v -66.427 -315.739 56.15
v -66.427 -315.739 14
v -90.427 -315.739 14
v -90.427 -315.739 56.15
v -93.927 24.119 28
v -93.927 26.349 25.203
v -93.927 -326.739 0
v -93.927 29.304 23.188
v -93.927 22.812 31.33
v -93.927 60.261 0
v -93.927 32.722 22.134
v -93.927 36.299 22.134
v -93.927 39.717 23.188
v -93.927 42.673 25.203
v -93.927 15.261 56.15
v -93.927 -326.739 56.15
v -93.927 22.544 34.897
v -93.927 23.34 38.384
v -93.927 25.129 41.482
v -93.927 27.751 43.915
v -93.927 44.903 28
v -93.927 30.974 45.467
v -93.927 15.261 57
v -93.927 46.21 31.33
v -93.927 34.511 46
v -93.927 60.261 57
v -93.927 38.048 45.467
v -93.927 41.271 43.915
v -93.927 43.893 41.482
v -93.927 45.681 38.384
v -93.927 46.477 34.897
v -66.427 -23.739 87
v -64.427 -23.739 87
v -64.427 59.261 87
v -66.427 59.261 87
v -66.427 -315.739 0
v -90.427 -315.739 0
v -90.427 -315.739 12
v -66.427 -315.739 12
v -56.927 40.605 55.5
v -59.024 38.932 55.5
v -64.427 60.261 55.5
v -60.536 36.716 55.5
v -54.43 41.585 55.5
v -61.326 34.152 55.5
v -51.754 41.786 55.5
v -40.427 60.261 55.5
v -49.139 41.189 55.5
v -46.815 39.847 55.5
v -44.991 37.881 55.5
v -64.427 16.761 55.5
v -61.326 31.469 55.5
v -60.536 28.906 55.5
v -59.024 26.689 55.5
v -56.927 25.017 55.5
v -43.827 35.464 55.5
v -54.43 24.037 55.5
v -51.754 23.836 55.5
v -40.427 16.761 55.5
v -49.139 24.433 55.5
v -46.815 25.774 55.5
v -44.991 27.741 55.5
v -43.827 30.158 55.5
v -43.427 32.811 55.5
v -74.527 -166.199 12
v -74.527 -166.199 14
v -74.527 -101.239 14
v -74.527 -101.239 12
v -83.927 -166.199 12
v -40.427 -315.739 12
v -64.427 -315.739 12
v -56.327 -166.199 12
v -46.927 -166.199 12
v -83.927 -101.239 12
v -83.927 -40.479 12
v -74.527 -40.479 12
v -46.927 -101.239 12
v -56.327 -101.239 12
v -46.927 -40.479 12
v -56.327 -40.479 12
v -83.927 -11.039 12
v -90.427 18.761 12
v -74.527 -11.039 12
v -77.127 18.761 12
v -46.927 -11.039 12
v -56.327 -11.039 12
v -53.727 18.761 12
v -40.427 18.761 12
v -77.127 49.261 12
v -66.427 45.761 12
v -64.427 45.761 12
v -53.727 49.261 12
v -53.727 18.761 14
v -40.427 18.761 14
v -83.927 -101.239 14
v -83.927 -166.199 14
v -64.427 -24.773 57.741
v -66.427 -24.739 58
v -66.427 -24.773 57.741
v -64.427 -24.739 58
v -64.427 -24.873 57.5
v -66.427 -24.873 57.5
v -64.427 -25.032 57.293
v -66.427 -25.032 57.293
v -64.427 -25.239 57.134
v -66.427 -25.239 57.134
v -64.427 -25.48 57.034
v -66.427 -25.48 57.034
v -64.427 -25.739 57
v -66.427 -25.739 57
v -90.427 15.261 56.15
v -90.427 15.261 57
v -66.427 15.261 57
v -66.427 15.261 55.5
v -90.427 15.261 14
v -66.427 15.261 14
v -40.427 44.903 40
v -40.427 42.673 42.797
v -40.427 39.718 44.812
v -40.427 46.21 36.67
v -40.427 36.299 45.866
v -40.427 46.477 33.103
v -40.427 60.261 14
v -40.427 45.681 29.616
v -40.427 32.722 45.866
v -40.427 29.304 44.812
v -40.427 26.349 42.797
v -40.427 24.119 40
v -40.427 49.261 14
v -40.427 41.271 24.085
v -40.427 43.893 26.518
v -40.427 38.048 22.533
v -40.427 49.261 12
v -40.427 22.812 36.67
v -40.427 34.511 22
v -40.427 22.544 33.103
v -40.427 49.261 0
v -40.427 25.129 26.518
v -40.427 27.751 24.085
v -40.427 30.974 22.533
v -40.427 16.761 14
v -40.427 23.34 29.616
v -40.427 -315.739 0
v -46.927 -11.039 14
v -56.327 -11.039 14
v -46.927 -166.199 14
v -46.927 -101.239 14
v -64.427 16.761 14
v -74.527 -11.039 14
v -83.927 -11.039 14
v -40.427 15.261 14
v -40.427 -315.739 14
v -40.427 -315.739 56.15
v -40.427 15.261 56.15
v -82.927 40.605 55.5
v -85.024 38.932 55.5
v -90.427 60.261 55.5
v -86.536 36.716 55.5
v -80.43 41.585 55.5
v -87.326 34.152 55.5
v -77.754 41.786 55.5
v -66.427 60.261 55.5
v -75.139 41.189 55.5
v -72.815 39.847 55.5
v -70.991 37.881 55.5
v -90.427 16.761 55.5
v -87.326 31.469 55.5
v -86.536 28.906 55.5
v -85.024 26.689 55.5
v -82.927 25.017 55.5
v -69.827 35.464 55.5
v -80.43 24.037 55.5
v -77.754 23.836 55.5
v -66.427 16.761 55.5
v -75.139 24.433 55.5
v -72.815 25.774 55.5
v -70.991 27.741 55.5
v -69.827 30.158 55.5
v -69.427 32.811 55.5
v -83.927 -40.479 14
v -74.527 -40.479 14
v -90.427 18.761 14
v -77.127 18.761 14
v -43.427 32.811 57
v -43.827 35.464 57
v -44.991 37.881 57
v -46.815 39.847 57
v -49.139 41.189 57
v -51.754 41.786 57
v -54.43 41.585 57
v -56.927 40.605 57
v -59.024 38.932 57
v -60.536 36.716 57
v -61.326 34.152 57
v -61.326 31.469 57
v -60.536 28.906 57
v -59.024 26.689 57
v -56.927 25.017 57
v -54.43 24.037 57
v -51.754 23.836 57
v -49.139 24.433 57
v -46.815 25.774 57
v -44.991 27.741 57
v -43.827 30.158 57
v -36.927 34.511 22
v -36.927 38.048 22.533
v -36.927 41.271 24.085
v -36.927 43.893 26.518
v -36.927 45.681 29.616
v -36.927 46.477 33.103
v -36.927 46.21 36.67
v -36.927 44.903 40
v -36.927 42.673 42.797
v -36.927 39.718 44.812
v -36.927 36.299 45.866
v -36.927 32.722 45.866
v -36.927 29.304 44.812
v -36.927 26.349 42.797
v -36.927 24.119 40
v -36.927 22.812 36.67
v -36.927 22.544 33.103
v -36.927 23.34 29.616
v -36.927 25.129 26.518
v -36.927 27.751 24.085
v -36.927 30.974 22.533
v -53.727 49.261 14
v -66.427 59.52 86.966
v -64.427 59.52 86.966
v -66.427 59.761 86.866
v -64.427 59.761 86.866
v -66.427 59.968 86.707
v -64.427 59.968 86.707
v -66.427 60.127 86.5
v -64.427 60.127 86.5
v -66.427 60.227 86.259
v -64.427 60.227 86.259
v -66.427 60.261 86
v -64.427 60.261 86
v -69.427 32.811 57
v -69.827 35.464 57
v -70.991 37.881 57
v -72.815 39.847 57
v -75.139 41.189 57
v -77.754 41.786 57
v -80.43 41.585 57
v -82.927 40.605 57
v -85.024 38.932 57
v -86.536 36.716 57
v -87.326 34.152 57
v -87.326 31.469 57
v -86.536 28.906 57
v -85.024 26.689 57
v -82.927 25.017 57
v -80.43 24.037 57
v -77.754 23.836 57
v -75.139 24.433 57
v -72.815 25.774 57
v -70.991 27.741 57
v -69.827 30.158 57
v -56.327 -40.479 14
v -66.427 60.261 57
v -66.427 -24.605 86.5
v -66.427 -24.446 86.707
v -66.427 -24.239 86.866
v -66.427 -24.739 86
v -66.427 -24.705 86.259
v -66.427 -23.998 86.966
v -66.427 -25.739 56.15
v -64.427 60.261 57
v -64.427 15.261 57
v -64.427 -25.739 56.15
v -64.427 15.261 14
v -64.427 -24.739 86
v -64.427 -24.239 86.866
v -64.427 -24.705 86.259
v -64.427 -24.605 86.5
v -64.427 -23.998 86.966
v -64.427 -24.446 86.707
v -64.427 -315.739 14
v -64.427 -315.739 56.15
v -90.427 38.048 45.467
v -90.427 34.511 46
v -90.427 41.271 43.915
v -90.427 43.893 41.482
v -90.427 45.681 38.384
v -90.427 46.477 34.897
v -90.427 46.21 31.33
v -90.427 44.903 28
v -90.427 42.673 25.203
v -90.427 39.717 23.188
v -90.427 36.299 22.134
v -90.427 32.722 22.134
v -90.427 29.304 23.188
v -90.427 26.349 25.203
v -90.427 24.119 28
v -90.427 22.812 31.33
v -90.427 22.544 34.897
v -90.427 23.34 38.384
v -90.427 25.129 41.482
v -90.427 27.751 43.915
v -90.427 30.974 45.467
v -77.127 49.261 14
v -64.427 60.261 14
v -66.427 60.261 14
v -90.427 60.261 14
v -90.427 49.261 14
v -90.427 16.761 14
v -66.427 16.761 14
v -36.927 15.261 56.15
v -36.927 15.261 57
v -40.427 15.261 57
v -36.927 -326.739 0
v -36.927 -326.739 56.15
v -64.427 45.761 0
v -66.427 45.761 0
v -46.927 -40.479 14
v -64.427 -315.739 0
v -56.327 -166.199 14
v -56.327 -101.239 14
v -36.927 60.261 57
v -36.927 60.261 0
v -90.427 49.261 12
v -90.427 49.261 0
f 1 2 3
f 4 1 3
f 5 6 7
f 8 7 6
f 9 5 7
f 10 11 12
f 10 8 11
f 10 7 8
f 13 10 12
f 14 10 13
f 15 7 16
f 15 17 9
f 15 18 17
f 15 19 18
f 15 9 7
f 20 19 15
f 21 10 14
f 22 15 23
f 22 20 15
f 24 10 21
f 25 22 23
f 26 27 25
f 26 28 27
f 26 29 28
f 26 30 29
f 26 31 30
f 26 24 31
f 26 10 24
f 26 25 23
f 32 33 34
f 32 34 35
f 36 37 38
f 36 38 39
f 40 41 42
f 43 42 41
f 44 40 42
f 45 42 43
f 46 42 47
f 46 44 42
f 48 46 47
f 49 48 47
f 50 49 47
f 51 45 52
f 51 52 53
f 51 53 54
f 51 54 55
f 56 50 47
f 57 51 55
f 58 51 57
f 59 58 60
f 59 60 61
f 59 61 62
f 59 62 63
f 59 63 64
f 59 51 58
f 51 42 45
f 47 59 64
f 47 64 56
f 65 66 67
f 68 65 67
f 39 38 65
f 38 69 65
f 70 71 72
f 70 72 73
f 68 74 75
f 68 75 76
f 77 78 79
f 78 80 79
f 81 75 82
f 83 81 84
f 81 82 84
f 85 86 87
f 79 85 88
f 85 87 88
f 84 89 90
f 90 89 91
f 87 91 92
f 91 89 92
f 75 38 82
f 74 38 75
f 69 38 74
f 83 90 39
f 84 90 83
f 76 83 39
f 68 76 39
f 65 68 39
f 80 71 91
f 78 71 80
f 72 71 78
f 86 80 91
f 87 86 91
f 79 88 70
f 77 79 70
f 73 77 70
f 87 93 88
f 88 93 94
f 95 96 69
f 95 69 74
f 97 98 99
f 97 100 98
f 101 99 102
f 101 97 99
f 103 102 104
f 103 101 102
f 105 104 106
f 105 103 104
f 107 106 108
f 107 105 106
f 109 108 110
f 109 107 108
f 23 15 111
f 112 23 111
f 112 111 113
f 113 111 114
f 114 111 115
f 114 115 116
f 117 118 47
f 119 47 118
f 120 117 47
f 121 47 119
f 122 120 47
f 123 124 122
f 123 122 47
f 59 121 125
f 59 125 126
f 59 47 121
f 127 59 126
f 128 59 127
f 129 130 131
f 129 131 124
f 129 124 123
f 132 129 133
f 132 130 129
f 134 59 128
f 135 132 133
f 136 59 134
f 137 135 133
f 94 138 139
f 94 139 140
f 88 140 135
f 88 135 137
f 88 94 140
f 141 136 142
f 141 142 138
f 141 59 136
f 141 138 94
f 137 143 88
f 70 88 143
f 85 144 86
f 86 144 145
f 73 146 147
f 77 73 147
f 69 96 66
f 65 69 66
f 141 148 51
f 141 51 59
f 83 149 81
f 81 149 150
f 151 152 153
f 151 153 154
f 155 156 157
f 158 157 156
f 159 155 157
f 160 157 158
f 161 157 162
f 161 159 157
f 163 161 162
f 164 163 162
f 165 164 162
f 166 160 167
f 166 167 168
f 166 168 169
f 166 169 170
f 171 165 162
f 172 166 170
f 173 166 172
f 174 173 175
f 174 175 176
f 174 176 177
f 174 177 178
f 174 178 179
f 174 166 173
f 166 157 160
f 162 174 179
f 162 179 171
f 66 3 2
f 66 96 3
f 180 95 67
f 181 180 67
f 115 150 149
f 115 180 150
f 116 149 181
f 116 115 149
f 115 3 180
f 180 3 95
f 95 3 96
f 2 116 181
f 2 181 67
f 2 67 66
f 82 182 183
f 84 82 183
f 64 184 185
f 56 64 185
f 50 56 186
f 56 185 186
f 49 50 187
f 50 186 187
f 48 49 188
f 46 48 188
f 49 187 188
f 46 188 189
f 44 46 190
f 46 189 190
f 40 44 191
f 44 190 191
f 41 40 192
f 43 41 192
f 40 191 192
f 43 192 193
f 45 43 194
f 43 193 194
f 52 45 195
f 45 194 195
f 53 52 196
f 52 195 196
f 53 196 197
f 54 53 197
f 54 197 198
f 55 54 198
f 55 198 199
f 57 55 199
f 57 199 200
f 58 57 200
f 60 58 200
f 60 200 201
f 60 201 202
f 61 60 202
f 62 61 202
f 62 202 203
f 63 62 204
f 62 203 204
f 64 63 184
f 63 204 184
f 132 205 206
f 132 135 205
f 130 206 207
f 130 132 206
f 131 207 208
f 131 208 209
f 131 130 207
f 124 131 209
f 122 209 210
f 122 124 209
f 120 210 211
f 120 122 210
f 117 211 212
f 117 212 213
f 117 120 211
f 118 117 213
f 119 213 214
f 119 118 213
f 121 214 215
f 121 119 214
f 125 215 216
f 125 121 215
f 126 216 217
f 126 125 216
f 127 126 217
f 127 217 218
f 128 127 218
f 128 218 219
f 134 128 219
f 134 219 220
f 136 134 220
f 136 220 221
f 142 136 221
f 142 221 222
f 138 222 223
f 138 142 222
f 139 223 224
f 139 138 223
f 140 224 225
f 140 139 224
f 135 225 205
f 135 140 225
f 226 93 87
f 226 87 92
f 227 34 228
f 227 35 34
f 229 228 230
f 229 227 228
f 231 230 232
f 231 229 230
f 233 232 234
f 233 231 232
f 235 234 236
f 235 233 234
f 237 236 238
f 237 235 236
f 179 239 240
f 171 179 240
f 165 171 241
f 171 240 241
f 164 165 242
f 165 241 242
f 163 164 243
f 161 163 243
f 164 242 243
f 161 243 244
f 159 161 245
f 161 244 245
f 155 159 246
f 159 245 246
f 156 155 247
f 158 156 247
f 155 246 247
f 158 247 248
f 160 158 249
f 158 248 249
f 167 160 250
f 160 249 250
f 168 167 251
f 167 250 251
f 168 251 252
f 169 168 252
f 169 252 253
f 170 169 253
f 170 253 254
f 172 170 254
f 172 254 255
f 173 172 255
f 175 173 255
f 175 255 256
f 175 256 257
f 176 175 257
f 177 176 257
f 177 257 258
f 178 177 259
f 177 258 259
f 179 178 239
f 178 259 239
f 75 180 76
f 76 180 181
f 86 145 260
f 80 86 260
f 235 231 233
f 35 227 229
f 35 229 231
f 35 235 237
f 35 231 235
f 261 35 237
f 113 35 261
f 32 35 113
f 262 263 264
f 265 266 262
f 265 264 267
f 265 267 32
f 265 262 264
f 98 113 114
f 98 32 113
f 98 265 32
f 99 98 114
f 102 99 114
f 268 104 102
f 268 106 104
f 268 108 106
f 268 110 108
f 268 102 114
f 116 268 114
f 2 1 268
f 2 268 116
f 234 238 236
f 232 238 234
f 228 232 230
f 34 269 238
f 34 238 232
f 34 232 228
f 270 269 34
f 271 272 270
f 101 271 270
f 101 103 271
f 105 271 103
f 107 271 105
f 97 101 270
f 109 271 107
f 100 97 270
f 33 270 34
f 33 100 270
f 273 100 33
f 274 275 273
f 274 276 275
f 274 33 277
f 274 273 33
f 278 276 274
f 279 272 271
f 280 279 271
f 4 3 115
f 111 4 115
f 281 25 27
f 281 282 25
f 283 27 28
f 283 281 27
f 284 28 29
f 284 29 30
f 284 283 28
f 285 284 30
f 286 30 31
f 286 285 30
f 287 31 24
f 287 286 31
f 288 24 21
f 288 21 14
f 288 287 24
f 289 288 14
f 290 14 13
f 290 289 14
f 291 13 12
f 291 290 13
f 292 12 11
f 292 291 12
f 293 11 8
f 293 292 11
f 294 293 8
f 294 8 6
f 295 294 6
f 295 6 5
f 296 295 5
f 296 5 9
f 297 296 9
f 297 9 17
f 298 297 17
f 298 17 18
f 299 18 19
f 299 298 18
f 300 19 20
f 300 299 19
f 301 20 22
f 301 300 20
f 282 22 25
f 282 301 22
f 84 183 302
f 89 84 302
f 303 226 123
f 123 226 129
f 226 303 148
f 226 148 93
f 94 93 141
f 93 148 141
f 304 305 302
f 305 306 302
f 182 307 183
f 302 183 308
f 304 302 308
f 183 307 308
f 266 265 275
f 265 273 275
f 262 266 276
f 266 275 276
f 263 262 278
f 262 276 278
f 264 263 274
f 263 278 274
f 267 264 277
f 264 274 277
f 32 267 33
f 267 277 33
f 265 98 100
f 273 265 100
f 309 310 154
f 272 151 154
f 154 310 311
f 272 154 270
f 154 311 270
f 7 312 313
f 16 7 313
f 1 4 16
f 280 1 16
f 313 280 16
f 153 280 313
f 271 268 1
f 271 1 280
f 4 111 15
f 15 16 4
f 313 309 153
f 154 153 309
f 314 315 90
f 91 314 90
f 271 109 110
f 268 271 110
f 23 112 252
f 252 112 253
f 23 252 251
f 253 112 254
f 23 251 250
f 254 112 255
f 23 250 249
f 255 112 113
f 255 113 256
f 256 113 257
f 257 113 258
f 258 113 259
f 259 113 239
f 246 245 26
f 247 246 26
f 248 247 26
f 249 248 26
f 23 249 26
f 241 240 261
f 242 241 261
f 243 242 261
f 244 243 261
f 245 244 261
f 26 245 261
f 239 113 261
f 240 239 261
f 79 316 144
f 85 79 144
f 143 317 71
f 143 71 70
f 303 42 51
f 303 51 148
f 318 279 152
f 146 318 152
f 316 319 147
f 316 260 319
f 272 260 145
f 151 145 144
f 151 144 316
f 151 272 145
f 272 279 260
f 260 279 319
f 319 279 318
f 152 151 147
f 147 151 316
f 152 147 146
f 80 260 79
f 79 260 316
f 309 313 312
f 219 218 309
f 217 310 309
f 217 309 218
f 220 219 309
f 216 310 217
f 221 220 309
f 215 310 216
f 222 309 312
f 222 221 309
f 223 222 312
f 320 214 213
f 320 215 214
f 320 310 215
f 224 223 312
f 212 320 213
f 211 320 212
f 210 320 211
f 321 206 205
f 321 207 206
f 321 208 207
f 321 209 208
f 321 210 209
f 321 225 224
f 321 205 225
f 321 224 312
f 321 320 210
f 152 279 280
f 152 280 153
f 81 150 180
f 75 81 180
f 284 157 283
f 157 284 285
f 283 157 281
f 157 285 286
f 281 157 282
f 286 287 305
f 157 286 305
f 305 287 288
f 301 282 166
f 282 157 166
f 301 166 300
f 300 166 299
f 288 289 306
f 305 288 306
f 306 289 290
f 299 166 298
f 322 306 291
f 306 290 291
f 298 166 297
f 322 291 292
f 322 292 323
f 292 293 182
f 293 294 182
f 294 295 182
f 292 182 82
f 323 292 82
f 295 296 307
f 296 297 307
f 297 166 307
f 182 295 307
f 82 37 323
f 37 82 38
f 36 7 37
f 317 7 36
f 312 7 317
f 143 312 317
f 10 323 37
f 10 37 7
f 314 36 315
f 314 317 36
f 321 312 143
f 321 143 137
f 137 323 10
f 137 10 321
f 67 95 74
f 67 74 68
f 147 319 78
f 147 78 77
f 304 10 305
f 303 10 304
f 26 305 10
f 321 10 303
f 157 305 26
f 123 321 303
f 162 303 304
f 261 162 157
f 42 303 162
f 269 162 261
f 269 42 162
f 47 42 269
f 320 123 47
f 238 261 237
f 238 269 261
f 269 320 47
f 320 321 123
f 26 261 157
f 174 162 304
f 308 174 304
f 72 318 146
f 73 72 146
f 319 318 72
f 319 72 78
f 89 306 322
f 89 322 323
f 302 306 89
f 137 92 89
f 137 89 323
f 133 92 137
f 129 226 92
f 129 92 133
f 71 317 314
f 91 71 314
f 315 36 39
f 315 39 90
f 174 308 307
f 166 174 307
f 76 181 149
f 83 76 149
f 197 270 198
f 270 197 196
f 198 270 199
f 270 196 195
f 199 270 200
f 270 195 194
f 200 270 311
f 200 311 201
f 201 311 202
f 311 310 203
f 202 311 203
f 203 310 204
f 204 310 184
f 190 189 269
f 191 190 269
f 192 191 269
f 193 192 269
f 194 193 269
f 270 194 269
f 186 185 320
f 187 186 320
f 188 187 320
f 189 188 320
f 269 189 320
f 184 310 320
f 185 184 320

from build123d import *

# Parameters (mm, degrees)
SZKIC1_W                     = 53
SZKIC1_H                     = 374
SZKIC1_W_2                   = 24
SZKIC1_H_2                   = 365
DODANIE_WYCI_GNI_CIE2_DEPTH  = 12
SZKIC2_W                     = 12
SZKIC2_H                     = 3.5
WYTNIJ_WYCI_GNI_CIE1_DEPTH   = 2
SZKIC3_W                     = 53
SZKIC3_H                     = 374
DODANIE_WYCI_GNI_CIE3_DEPTH  = 2
SZKIC4_W                     = 13.3
SZKIC4_H                     = 30.500081729
SZKIC4_W_2                   = 9.4
SZKIC4_H_2                   = 64.96
WYTNIJ_WYCI_GNI_CIE2_DEPTH   = 2
SZKIC5_W                     = 2
SZKIC5_H                     = 374
DODANIE_WYCI_GNI_CIE4_DEPTH  = 43
DODANIE_WYCI_GNI_CIE5_DEPTH  = 41.5
SZKIC7_W                     = 25.5
SZKIC7_H                     = 38.500081729
DODANIE_WYCI_GNI_CIE6_DEPTH  = 1.5
SZKIC9_R                     = 12
WYTNIJ_WYCI_GNI_CIE4_DEPTH   = 1.5
DODANIE_WYCI_GNI_CIE7_DEPTH  = 43
DODANIE_WYCI_GNI_CIE8_DEPTH  = 43
SZKIC12_R                    = 12
WYTNIJ_WYCI_GNI_CIE5_DEPTH   = 1.5
SZKIC13_R                    = 9
WYTNIJ_WYCI_GNI_CIE6_DEPTH   = 1.5
SZKIC14_W                    = 57
SZKIC14_H                    = 374
SZKIC14_R                    = 12
DODANIE_WYCI_GNI_CIE9_DEPTH  = 1
SZKIC15_W                    = 57
SZKIC15_H                    = 374
SZKIC15_R                    = 12
DODANIE_WYCI_GNI_CIE10_DEPTH = 1
SZKIC16_W                    = 55
SZKIC16_H                    = 57
SZKIC16_W_2                  = 24
SZKIC16_H_2                  = 41.5
DODANIE_WYCI_GNI_CIE11_DEPTH = 1
SZKIC17_W                    = 55
SZKIC17_H                    = 57
DODANIE_WYCI_GNI_CIE12_DEPTH = 1
DODANIE_WYCI_GNI_CIE13_DEPTH = 30
SZKIC20_W                    = 55
SZKIC20_H                    = 57
DODANIE_WYCI_GNI_CIE14_DEPTH = 5.5
SZKIC21_W                    = 24
SZKIC21_H                    = 41.5
DODANIE_WYCI_GNI_CIE15_DEPTH = 5.5
SZKIC22_W                    = 57
SZKIC22_H                    = 387
SZKIC22_R                    = 12
DODANIE_WYCI_GNI_CIE16_DEPTH = 1
SZKIC23_W                    = 57
SZKIC23_H                    = 387
SZKIC23_R                    = 12
DODANIE_WYCI_GNI_CIE17_DEPTH = 1
ZAOKR_GLENIE1_R              = 1
ZAOKR_GLENIE2_R              = 1
ZAOKR_GLENIE3_R              = 1
WYTNIJ_WYCI_GNI_CIE7_DEPTH   = 0.85


with BuildPart() as part:
    # Szkic1 → Dodanie-wyciągnięcie2 (new body)
    with BuildSketch(Plane.XY):
        with Locations((-65.426891924, -133.239080048)):
            Rectangle(SZKIC1_W, SZKIC1_H)
        with Locations((-78.426891924, -133.239080048)):
            Rectangle(SZKIC1_W_2, SZKIC1_H_2, mode=Mode.SUBTRACT)
        with Locations((-52.426891924, -133.239080048)):
            Rectangle(SZKIC1_W_2, SZKIC1_H_2, mode=Mode.SUBTRACT)
    extrude(amount=DODANIE_WYCI_GNI_CIE2_DEPTH)

    # Szkic2 → Wytnij-wyciągnięcie1 (cut)
    with BuildSketch(Plane.ZY.offset(66.426891924)):
        with Locations((6, 47.510919952)):
            Rectangle(SZKIC2_W, SZKIC2_H)
    extrude(amount=-WYTNIJ_WYCI_GNI_CIE1_DEPTH, mode=Mode.SUBTRACT)

    # Szkic3 → Dodanie-wyciągnięcie3 (add)
    with BuildSketch(Plane.XY.offset(12)):
        with Locations((-65.426891924, -133.239080048)):
            Rectangle(SZKIC3_W, SZKIC3_H)
    extrude(amount=DODANIE_WYCI_GNI_CIE3_DEPTH)

    # Szkic4 → Wytnij-wyciągnięcie2 (cut)
    with BuildSketch(Plane.XY.offset(14)):
        Polygon((-46.926891924, -11.039080048), (-56.326891924, -11.039080048), (-56.326891924, -35.399080048), (-56.326891924, -40.479080048), (-46.926891924, -40.479080048), (-46.926891924, -35.399080048), align=None)
        with Locations((-47.076891924, 34.010879088)):
            Rectangle(SZKIC4_W, SZKIC4_H)
        with Locations((-83.776891924, 34.010879088)):
            Rectangle(SZKIC4_W, SZKIC4_H)
        Polygon((-74.526891924, -35.399080048), (-74.526891924, -11.039080048), (-83.926891924, -11.039080048), (-83.926891924, -35.399080048), (-83.926891924, -40.479080048), (-74.526891924, -40.479080048), align=None)
        with Locations((-51.626891924, -133.719080048)):
            Rectangle(SZKIC4_W_2, SZKIC4_H_2)
        with Locations((-79.226891924, -133.719080048)):
            Rectangle(SZKIC4_W_2, SZKIC4_H_2)
    extrude(amount=-WYTNIJ_WYCI_GNI_CIE2_DEPTH, mode=Mode.SUBTRACT)

    # Szkic5 → Dodanie-wyciągnięcie4 (add)
    with BuildSketch(Plane.XY.offset(14)):
        with Locations((-65.426891924, -133.239080048)):
            Rectangle(SZKIC5_W, SZKIC5_H)
    extrude(amount=DODANIE_WYCI_GNI_CIE4_DEPTH)

    # Szkic6 → Dodanie-wyciągnięcie5 (add)
    with BuildSketch(Plane.XY.offset(14)):
        Polygon((-64.426891924, 16.760838223), (-40.426891924, 16.760838223), (-40.426891924, 53.760919952), (-38.926891924, 53.760919952), (-38.926891924, 15.260838223), (-64.426891924, 15.260838223), align=None)
        Polygon((-90.426891924, 53.760919952), (-91.926891924, 53.760919952), (-91.926891924, 15.260838223), (-66.426891924, 15.260838223), (-66.426891924, 16.760838223), (-90.426891924, 16.760838223), align=None)
    extrude(amount=DODANIE_WYCI_GNI_CIE5_DEPTH)

    # Szkic7 → Dodanie-wyciągnięcie6 (add)
    with BuildSketch(Plane.XY.offset(55.5)):
        with Locations((-51.676891924, 34.510879088)):
            Rectangle(SZKIC7_W, SZKIC7_H)
        with Locations((-79.176891924, 34.510879088)):
            Rectangle(SZKIC7_W, SZKIC7_H)
    extrude(amount=DODANIE_WYCI_GNI_CIE6_DEPTH)

    # Szkic9 → Wytnij-wyciągnięcie4 (cut)
    with BuildSketch(Plane.ZY.offset(91.926891924)):
        with Locations((34, 34.510879088)):
            Circle(SZKIC9_R)
    extrude(amount=-WYTNIJ_WYCI_GNI_CIE4_DEPTH, mode=Mode.SUBTRACT)

    # Szkic10 → Dodanie-wyciągnięcie7 (add)
    with BuildSketch(Plane.XY.offset(14)):
        Polygon((-91.926891924, 15.260838223), (-91.926891924, -320.239080048), (-66.426891924, -320.239080048), (-66.426891924, -315.739080048), (-90.426891924, -315.739080048), (-90.426891924, 15.260838223), align=None)
    extrude(amount=DODANIE_WYCI_GNI_CIE7_DEPTH)

    # Szkic11 → Dodanie-wyciągnięcie8 (add)
    with BuildSketch(Plane.XY.offset(14)):
        Polygon((-38.926891924, 15.260838223), (-38.926891924, -320.239080048), (-64.426891924, -320.239080048), (-64.426891924, -315.739080048), (-40.426891924, -315.739080048), (-40.426891924, 15.260838223), align=None)
    extrude(amount=DODANIE_WYCI_GNI_CIE8_DEPTH)

    # Szkic12 → Wytnij-wyciągnięcie5 (cut)
    with BuildSketch(Plane(origin=(-38.926891924, 0, 0), x_dir=(0, 0, -1), z_dir=(1, 0, 0))):
        with Locations((-34, 34.510919952)):
            Circle(SZKIC12_R)
    extrude(amount=-WYTNIJ_WYCI_GNI_CIE5_DEPTH, mode=Mode.SUBTRACT)

    # Szkic13 → Wytnij-wyciągnięcie6 (cut)
    with BuildSketch(Plane.XY.offset(57)):
        with Locations((-78.426891924, 32.810879088)):
            Circle(SZKIC13_R)
        with Locations((-52.426891924, 32.810879088)):
            Circle(SZKIC13_R)
    extrude(amount=-WYTNIJ_WYCI_GNI_CIE6_DEPTH, mode=Mode.SUBTRACT)

    # Szkic14 → Dodanie-wyciągnięcie9 (add)
    with BuildSketch(Plane(origin=(-38.926891924, 0, 0), x_dir=(0, 0, -1), z_dir=(1, 0, 0))):
        with Locations((-28.5, -133.239080048)):
            Rectangle(SZKIC14_W, SZKIC14_H)
        with Locations((-34, 34.510919952)):
            Circle(SZKIC14_R, mode=Mode.SUBTRACT)
    extrude(amount=DODANIE_WYCI_GNI_CIE9_DEPTH)

    # Szkic15 → Dodanie-wyciągnięcie10 (add)
    with BuildSketch(Plane.ZY.offset(91.926891924)):
        with Locations((28.5, -133.239080048)):
            Rectangle(SZKIC15_W, SZKIC15_H)
        with Locations((34, 34.510879088)):
            Circle(SZKIC15_R, mode=Mode.SUBTRACT)
    extrude(amount=DODANIE_WYCI_GNI_CIE10_DEPTH)

    # Szkic16 → Dodanie-wyciągnięcie11 (add)
    with BuildSketch(Plane(origin=(0, 53.760919952, 0), x_dir=(1, 0, 0), z_dir=(0, 1, 0))):
        with Locations((-65.426891924, -28.5)):
            Rectangle(SZKIC16_W, SZKIC16_H)
        with Locations((-52.426891924, -34.75)):
            Rectangle(SZKIC16_W_2, SZKIC16_H_2, mode=Mode.SUBTRACT)
        with Locations((-78.426891924, -34.75)):
            Rectangle(SZKIC16_W_2, SZKIC16_H_2, mode=Mode.SUBTRACT)
    extrude(amount=DODANIE_WYCI_GNI_CIE11_DEPTH)

    # Szkic17 → Dodanie-wyciągnięcie12 (add)
    with BuildSketch(Plane.XZ.offset(320.239080048)):
        with Locations((-65.426891924, 28.5)):
            Rectangle(SZKIC17_W, SZKIC17_H)
    extrude(amount=DODANIE_WYCI_GNI_CIE12_DEPTH)

    # Szkic18 → Dodanie-wyciągnięcie13 (add)
    with BuildSketch(Plane.XY.offset(57)):
        Polygon((-64.426891924, 15.260838223), (-64.426891924, 54.760919952), (-66.426891924, 54.760919952), (-66.426891924, 15.260838223), (-66.426891924, -4.739161777), (-66.426891924, -24.739161777), (-64.426891924, -24.739161777), (-64.426891924, -4.739161777), align=None)
    extrude(amount=DODANIE_WYCI_GNI_CIE13_DEPTH)

    # Szkic20 → Dodanie-wyciągnięcie14 (add)
    with BuildSketch(Plane.XZ.offset(321.239080048)):
        with Locations((-65.426891924, 28.5)):
            Rectangle(SZKIC20_W, SZKIC20_H)
    extrude(amount=DODANIE_WYCI_GNI_CIE14_DEPTH)

    # Szkic21 → Dodanie-wyciągnięcie15 (add)
    with BuildSketch(Plane(origin=(0, 54.760919952, 0), x_dir=(1, 0, 0), z_dir=(0, 1, 0))):
        Polygon((-64.426891924, -87), (-66.426891924, -87), (-66.426891924, -57), (-92.926891924, -57), (-92.926891924, 0), (-37.926891924, 0), (-37.926891924, -57), (-64.426891924, -57), align=None)
        with Locations((-52.426891924, -34.75)):
            Rectangle(SZKIC21_W, SZKIC21_H, mode=Mode.SUBTRACT)
        with Locations((-78.426891924, -34.75)):
            Rectangle(SZKIC21_W, SZKIC21_H, mode=Mode.SUBTRACT)
    extrude(amount=DODANIE_WYCI_GNI_CIE15_DEPTH)

    # Szkic22 → Dodanie-wyciągnięcie16 (add)
    with BuildSketch(Plane(origin=(-37.926891924, 0, 0), x_dir=(0, 0, -1), z_dir=(1, 0, 0))):
        with Locations((-28.5, -133.239080048)):
            Rectangle(SZKIC22_W, SZKIC22_H)
        with Locations((-34, 34.510919952)):
            Circle(SZKIC22_R, mode=Mode.SUBTRACT)
    extrude(amount=DODANIE_WYCI_GNI_CIE16_DEPTH)

    # Szkic23 → Dodanie-wyciągnięcie17 (add)
    with BuildSketch(Plane.ZY.offset(92.926891924)):
        with Locations((28.5, -133.239080048)):
            Rectangle(SZKIC23_W, SZKIC23_H)
        with Locations((34, 34.510879088)):
            Circle(SZKIC23_R, mode=Mode.SUBTRACT)
    extrude(amount=DODANIE_WYCI_GNI_CIE17_DEPTH)

    # Zaokrąglenie1
    zaokr_glenie1_edges = [part.edges().sort_by_distance(p)[0] for p in [
        (-65.426891924, -24.739161777, 87),
    ]]
    fillet(zaokr_glenie1_edges, radius=ZAOKR_GLENIE1_R)

    # Zaokrąglenie2
    zaokr_glenie2_edges = [part.edges().sort_by_distance(p)[0] for p in [
        (-65.426891924, -24.739161777, 57),
    ]]
    fillet(zaokr_glenie2_edges, radius=ZAOKR_GLENIE2_R)

    # Zaokrąglenie3
    zaokr_glenie3_edges = [part.edges().sort_by_distance(p)[0] for p in [
        (-65.426891924, 60.260919952, 87),
    ]]
    fillet(zaokr_glenie3_edges, radius=ZAOKR_GLENIE3_R)

    # Szkic24 → Wytnij-wyciągnięcie7 (cut)
    with BuildSketch(Plane.XY.offset(57)):
        Polygon((-64.426891924, 15.260838223), (-64.426891924, -25.739161777), (-66.426891924, -25.739161777), (-66.426891924, 15.260838223), (-93.926891924, 15.260838223), (-93.926891924, -326.739080048), (-36.926891924, -326.739080048), (-36.926891924, 15.260838223), align=None)
    extrude(amount=-WYTNIJ_WYCI_GNI_CIE7_DEPTH, mode=Mode.SUBTRACT)


solid = part.part
